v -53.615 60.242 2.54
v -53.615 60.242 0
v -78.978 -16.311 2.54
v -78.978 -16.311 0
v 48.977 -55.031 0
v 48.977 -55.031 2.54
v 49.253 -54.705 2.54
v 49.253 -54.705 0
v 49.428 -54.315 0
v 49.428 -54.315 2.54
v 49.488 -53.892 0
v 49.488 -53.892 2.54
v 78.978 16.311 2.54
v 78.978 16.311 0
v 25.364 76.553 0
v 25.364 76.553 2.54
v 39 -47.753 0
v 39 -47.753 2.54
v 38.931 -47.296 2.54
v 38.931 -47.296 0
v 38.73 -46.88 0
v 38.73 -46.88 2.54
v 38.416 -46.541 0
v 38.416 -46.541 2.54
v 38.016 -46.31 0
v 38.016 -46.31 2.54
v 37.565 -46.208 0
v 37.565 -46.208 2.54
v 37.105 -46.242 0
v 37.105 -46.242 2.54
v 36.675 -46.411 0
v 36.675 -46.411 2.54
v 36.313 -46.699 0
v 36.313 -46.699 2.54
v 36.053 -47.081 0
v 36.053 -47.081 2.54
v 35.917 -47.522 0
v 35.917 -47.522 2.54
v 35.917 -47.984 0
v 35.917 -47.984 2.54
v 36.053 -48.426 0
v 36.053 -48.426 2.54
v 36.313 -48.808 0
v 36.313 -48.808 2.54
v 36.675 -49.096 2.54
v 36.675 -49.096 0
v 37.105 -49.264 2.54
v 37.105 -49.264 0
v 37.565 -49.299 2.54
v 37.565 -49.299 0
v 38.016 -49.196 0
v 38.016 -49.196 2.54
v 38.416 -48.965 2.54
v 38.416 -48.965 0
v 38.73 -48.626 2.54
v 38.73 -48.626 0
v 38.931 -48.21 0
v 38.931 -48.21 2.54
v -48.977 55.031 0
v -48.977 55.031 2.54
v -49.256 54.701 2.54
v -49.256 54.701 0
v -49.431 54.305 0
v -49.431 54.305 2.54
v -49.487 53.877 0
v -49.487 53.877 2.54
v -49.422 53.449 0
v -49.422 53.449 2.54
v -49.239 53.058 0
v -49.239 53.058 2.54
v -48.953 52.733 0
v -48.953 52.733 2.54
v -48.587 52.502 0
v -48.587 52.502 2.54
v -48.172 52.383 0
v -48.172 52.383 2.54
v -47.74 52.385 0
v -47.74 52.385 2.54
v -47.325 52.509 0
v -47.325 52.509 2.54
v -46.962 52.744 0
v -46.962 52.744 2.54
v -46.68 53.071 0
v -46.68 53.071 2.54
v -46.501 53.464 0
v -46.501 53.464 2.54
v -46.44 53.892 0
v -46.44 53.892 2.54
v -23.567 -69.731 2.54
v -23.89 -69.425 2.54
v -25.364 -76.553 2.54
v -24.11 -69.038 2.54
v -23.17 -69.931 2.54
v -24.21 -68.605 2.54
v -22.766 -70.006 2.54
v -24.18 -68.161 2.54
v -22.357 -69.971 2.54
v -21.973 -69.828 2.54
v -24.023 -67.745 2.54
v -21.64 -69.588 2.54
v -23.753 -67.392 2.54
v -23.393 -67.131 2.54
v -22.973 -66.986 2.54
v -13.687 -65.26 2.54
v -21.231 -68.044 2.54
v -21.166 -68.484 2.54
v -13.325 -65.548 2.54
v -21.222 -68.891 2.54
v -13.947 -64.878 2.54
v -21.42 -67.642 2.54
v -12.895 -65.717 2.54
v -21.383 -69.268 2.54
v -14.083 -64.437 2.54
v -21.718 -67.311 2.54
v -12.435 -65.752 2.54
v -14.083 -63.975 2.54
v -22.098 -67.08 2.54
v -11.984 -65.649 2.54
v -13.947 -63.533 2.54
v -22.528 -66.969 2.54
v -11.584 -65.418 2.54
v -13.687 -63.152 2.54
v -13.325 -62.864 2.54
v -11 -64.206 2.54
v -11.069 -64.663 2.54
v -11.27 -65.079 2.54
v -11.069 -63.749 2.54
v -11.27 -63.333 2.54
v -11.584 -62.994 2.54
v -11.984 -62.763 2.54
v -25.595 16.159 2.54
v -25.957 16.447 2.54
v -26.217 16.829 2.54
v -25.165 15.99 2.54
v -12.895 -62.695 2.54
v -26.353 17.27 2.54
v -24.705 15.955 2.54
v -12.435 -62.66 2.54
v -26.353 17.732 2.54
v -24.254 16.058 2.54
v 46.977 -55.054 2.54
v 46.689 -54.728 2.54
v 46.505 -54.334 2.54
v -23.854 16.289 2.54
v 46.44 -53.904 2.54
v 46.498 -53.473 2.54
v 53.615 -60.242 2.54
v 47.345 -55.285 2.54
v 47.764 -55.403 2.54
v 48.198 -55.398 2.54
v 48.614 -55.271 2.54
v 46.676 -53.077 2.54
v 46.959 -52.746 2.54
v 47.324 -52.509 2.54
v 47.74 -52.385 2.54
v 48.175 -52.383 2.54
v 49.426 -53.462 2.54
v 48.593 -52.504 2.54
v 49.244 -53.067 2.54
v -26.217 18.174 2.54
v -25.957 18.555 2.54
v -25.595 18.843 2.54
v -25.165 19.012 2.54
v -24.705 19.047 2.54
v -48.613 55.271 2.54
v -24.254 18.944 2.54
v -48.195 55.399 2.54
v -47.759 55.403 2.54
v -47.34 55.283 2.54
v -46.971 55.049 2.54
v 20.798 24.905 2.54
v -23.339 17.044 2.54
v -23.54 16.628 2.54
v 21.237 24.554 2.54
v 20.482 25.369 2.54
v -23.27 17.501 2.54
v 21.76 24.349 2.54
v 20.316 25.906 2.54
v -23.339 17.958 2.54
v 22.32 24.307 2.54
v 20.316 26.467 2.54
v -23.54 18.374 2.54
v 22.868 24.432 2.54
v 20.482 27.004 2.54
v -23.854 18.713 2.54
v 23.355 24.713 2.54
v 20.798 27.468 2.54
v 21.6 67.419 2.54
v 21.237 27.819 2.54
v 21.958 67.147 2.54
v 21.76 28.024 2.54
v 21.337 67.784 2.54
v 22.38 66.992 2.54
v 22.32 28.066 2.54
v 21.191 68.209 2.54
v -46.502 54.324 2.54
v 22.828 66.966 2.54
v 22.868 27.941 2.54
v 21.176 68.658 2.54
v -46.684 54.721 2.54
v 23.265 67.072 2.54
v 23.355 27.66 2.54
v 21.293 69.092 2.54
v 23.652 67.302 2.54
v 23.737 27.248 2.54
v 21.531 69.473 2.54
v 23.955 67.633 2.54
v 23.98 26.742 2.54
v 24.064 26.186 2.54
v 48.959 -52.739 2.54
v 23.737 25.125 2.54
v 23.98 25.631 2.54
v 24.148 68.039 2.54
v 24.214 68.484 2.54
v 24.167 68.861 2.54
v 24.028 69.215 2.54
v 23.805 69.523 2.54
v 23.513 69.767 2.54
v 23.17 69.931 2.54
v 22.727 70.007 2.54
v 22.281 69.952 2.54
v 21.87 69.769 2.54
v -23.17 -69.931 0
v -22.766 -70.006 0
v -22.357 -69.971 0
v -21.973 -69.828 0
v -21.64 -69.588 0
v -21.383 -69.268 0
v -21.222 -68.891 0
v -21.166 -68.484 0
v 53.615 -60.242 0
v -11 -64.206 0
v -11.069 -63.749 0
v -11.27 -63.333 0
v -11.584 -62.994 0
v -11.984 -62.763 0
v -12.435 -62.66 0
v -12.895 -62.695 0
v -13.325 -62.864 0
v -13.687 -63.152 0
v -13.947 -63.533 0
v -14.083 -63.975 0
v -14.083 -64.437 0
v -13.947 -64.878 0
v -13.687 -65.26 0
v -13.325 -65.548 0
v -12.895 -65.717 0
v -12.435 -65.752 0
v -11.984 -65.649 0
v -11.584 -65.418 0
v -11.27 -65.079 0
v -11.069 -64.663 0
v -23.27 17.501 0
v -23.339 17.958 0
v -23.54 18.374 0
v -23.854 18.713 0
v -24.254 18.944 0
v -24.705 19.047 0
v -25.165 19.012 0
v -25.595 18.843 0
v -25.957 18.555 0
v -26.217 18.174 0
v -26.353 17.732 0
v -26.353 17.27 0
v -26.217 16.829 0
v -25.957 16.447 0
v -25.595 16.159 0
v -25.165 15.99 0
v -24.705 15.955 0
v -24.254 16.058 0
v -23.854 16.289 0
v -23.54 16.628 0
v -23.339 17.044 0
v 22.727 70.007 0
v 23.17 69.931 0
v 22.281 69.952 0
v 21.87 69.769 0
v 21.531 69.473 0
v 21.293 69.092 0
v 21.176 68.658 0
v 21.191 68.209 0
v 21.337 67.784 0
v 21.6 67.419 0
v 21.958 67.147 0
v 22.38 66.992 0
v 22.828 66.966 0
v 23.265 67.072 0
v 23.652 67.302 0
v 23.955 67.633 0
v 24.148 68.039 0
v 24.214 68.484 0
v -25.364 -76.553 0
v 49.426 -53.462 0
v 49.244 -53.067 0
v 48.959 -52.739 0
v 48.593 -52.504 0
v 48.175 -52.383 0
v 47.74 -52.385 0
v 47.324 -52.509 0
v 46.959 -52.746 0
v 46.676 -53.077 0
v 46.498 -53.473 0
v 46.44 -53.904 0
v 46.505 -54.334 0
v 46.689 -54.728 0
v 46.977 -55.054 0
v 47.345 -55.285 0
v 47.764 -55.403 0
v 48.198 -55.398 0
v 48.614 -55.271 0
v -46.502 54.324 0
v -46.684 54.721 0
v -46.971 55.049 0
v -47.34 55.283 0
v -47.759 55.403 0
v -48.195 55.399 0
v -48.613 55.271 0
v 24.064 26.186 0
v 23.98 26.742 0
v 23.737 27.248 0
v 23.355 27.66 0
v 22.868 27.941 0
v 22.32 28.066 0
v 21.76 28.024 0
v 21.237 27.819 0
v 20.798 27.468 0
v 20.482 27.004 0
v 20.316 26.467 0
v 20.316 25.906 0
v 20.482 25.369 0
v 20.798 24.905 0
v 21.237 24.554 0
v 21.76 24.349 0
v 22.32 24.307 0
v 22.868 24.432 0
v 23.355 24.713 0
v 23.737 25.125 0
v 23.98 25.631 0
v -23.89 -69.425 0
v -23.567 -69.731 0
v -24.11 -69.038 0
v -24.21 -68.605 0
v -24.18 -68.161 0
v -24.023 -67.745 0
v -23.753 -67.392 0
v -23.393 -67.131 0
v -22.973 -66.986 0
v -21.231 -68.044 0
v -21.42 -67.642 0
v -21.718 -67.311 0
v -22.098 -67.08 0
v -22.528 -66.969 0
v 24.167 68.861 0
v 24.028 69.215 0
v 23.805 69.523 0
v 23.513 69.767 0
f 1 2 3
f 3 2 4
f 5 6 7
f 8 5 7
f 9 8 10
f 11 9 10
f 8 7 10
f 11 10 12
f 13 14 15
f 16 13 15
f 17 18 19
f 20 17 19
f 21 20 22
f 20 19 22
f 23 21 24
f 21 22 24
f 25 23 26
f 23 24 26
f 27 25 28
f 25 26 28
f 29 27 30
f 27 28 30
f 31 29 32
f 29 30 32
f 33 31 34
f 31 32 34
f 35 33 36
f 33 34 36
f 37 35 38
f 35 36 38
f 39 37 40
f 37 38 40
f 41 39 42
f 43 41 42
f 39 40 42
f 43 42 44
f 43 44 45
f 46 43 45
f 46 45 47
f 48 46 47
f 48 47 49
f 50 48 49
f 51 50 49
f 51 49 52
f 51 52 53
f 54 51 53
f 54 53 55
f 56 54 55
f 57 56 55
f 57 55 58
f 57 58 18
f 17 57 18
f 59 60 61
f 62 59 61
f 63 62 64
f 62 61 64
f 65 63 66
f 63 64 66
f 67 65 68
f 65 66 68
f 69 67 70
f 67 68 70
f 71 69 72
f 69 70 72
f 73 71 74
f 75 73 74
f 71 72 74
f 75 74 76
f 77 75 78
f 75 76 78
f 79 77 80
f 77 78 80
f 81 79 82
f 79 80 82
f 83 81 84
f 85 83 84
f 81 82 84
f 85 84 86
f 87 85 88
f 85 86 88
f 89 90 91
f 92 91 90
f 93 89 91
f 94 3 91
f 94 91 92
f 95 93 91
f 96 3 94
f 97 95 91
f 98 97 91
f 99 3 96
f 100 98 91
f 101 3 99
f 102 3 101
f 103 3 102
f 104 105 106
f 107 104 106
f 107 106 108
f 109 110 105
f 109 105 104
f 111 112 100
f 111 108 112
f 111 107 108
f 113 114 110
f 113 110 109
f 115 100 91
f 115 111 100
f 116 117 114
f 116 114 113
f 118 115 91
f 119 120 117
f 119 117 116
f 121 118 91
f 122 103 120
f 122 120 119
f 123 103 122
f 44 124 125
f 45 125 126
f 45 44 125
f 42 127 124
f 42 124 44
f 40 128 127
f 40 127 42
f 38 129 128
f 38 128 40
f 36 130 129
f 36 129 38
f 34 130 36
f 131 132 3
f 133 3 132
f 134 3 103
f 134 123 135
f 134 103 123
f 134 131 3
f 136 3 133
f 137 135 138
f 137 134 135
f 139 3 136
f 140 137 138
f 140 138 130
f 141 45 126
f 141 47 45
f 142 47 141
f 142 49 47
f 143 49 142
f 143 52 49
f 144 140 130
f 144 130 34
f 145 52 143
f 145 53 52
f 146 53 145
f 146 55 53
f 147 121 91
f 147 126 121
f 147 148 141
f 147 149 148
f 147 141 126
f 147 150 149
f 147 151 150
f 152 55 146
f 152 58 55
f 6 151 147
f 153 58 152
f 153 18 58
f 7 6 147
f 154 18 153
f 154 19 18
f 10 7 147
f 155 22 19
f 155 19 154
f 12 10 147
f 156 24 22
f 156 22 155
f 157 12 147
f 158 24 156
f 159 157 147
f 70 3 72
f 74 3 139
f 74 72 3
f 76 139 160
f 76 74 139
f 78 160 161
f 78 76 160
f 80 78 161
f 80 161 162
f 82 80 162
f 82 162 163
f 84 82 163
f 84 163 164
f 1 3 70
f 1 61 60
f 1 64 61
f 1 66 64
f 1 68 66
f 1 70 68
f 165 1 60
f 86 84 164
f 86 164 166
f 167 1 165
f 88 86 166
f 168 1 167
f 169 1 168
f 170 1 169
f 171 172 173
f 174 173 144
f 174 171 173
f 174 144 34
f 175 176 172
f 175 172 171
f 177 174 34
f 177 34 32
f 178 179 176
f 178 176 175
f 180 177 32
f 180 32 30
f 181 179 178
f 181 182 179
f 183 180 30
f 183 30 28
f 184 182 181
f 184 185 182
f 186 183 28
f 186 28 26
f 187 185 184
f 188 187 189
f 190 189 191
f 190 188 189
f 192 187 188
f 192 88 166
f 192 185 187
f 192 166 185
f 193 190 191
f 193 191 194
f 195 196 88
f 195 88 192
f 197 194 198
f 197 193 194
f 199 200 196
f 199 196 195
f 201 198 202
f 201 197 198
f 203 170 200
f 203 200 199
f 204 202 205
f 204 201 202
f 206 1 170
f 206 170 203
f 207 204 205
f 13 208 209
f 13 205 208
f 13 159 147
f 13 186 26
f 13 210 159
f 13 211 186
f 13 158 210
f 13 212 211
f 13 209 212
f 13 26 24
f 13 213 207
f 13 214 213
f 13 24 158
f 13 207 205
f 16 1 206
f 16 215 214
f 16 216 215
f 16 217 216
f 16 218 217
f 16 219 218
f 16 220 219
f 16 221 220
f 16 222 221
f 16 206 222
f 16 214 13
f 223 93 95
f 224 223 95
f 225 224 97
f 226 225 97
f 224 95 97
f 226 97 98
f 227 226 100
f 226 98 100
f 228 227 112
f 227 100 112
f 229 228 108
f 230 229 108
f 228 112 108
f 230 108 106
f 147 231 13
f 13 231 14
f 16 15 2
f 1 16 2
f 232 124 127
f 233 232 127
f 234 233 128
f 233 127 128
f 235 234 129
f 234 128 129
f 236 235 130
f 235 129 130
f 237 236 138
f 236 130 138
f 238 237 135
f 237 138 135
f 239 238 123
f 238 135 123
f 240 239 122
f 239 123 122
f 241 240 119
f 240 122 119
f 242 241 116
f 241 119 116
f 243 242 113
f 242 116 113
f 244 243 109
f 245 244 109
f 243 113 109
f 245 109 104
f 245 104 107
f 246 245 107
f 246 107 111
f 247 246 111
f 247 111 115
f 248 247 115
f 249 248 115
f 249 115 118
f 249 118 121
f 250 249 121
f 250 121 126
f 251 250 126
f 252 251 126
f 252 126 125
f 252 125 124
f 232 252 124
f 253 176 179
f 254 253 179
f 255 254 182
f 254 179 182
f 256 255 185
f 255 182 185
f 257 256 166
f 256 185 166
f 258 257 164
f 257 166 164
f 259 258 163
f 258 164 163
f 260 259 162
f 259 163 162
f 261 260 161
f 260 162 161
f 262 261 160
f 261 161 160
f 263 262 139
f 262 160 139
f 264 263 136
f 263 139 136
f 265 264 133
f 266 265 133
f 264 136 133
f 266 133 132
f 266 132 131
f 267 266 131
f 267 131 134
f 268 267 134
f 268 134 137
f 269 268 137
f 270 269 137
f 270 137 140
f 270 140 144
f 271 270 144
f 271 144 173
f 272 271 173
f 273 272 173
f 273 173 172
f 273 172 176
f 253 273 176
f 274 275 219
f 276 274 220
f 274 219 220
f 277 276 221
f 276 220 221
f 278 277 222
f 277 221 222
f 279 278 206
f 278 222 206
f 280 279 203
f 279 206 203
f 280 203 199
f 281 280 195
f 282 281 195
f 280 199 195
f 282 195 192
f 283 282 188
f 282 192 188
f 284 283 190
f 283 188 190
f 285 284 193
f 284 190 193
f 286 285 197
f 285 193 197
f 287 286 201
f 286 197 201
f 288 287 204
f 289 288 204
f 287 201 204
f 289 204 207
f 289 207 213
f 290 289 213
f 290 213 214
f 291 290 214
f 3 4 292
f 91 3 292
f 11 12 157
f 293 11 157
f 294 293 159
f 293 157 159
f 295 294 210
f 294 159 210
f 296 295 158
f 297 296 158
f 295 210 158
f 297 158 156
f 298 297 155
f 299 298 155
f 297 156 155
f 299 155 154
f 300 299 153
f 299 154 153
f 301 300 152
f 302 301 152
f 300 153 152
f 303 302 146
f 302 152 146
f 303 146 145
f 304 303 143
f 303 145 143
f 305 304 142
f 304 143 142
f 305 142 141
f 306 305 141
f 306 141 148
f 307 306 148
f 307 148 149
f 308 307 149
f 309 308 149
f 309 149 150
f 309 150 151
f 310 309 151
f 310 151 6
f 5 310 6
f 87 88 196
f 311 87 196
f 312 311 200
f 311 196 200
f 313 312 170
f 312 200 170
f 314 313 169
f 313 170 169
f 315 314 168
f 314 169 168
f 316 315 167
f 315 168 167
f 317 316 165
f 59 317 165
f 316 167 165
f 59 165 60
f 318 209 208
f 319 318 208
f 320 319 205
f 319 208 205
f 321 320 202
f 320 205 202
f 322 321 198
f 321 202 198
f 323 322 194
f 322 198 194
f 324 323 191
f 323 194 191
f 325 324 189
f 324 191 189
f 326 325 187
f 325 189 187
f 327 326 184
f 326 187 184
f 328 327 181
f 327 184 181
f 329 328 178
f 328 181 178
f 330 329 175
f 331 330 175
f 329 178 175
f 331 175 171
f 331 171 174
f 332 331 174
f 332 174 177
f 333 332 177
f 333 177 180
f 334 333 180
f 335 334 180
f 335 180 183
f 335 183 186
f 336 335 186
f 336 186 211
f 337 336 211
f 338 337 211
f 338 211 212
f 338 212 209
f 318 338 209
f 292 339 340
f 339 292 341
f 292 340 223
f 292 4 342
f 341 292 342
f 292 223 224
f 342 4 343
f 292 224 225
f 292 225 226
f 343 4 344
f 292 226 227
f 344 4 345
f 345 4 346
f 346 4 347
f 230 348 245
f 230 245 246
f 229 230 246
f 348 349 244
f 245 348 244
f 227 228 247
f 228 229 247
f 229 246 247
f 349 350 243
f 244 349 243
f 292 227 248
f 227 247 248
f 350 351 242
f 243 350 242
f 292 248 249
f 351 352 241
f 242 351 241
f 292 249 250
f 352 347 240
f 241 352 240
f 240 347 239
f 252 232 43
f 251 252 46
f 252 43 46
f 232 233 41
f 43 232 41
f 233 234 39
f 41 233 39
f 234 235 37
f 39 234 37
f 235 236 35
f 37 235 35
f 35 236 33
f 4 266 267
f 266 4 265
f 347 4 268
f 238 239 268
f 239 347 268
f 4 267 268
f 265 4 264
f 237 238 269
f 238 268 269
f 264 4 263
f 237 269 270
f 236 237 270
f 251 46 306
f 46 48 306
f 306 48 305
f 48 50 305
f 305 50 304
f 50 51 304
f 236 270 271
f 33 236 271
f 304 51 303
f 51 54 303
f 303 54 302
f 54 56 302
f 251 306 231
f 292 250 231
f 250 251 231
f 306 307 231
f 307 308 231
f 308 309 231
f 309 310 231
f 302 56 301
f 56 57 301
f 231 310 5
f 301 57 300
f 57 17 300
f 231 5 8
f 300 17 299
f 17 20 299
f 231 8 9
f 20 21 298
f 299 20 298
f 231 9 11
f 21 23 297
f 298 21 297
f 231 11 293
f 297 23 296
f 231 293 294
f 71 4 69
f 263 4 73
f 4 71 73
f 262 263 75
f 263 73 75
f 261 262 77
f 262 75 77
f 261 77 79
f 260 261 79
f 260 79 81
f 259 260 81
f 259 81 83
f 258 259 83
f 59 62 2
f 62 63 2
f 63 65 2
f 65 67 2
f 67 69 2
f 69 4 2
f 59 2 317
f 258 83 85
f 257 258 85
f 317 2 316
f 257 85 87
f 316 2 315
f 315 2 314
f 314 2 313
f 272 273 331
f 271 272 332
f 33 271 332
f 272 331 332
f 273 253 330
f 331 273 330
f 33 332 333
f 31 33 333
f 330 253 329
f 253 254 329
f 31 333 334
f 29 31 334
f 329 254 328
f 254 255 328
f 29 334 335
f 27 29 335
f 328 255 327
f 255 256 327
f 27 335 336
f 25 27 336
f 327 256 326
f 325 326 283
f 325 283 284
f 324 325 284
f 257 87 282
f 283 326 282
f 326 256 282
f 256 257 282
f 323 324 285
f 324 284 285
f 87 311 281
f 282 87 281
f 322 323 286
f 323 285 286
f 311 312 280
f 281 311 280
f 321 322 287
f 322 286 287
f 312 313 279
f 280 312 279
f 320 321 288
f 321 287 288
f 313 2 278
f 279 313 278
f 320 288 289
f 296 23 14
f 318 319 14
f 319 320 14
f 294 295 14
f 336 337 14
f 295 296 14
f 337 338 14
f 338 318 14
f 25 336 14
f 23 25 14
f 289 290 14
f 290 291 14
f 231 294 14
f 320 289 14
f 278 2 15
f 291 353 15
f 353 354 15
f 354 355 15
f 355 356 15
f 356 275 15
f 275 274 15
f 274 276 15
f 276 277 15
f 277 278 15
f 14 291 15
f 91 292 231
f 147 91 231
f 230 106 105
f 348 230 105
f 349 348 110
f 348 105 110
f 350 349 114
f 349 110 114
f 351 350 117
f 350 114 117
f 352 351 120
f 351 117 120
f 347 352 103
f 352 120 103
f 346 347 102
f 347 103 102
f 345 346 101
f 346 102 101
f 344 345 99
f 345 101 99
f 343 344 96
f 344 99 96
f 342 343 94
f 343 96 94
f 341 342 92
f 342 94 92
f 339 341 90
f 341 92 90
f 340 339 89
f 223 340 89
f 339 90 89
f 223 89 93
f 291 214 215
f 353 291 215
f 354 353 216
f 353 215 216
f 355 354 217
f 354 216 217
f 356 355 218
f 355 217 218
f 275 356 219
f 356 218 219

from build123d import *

# Parameters (mm, degrees)
F1_DEPTH = 2.54
F3_DEPTH = 25.4
F4_R     = 1.55
F4_R_2   = 1.884603
F5_DEPTH = 25.4


with BuildPart() as f1:
    # F0 (on Top) → F1 (new body)
    with BuildSketch(Plane.XY):
        Polygon((25.3638, 76.552555), (-53.614557, 60.241973), (-78.978357, -16.310582), (-25.3638, -76.552555), (53.614557, -60.241973), (78.978357, 16.310582), align=None)
    extrude(amount=F1_DEPTH)

    # F2 (on face) → F3 (cut)
    with BuildSketch(Plane.XY.offset(2.54)):
        with BuildLine():
            ThreePointArc((24.21445, 68.483899), (23.925977, 69.376115), (23.169766, 69.930562))
            ThreePointArc((23.169766, 69.930562), (21.454923, 67.591684), (24.21445, 68.483899))
        make_face()
        with BuildLine():
            ThreePointArc((-46.439572, 53.892456), (-47.339682, 55.282901), (-48.97676, 55.030887))
            ThreePointArc((-48.97676, 55.030887), (-48.587461, 52.502011), (-46.439572, 53.892456))
        make_face()
        with BuildLine():
            ThreePointArc((-21.16645, -68.483899), (-23.582666, -67.248373), (-23.169766, -69.930562))
            ThreePointArc((-23.169766, -69.930562), (-21.798234, -69.719426), (-21.16645, -68.483899))
        make_face()
        with BuildLine():
            ThreePointArc((49.487572, -53.892456), (46.573126, -53.268566), (48.97676, -55.030887))
            ThreePointArc((48.97676, -55.030887), (49.354017, -54.516346), (49.487572, -53.892456))
        make_face()
    extrude(amount=-F3_DEPTH, mode=Mode.SUBTRACT)

    # F4 (on face) → F5 (cut)
    with BuildSketch(Plane.XY.offset(2.54)):
        with Locations((37.449616, -47.753262)):
            Circle(F4_R)
        with Locations((-12.550384, -64.205859)):
            Circle(F4_R)
        with Locations((22.179618, 26.186424)):
            Circle(F4_R_2)
        with Locations((-24.820382, 17.501104)):
            Circle(F4_R)
    extrude(amount=-F5_DEPTH, mode=Mode.SUBTRACT)


solid = f1.part
